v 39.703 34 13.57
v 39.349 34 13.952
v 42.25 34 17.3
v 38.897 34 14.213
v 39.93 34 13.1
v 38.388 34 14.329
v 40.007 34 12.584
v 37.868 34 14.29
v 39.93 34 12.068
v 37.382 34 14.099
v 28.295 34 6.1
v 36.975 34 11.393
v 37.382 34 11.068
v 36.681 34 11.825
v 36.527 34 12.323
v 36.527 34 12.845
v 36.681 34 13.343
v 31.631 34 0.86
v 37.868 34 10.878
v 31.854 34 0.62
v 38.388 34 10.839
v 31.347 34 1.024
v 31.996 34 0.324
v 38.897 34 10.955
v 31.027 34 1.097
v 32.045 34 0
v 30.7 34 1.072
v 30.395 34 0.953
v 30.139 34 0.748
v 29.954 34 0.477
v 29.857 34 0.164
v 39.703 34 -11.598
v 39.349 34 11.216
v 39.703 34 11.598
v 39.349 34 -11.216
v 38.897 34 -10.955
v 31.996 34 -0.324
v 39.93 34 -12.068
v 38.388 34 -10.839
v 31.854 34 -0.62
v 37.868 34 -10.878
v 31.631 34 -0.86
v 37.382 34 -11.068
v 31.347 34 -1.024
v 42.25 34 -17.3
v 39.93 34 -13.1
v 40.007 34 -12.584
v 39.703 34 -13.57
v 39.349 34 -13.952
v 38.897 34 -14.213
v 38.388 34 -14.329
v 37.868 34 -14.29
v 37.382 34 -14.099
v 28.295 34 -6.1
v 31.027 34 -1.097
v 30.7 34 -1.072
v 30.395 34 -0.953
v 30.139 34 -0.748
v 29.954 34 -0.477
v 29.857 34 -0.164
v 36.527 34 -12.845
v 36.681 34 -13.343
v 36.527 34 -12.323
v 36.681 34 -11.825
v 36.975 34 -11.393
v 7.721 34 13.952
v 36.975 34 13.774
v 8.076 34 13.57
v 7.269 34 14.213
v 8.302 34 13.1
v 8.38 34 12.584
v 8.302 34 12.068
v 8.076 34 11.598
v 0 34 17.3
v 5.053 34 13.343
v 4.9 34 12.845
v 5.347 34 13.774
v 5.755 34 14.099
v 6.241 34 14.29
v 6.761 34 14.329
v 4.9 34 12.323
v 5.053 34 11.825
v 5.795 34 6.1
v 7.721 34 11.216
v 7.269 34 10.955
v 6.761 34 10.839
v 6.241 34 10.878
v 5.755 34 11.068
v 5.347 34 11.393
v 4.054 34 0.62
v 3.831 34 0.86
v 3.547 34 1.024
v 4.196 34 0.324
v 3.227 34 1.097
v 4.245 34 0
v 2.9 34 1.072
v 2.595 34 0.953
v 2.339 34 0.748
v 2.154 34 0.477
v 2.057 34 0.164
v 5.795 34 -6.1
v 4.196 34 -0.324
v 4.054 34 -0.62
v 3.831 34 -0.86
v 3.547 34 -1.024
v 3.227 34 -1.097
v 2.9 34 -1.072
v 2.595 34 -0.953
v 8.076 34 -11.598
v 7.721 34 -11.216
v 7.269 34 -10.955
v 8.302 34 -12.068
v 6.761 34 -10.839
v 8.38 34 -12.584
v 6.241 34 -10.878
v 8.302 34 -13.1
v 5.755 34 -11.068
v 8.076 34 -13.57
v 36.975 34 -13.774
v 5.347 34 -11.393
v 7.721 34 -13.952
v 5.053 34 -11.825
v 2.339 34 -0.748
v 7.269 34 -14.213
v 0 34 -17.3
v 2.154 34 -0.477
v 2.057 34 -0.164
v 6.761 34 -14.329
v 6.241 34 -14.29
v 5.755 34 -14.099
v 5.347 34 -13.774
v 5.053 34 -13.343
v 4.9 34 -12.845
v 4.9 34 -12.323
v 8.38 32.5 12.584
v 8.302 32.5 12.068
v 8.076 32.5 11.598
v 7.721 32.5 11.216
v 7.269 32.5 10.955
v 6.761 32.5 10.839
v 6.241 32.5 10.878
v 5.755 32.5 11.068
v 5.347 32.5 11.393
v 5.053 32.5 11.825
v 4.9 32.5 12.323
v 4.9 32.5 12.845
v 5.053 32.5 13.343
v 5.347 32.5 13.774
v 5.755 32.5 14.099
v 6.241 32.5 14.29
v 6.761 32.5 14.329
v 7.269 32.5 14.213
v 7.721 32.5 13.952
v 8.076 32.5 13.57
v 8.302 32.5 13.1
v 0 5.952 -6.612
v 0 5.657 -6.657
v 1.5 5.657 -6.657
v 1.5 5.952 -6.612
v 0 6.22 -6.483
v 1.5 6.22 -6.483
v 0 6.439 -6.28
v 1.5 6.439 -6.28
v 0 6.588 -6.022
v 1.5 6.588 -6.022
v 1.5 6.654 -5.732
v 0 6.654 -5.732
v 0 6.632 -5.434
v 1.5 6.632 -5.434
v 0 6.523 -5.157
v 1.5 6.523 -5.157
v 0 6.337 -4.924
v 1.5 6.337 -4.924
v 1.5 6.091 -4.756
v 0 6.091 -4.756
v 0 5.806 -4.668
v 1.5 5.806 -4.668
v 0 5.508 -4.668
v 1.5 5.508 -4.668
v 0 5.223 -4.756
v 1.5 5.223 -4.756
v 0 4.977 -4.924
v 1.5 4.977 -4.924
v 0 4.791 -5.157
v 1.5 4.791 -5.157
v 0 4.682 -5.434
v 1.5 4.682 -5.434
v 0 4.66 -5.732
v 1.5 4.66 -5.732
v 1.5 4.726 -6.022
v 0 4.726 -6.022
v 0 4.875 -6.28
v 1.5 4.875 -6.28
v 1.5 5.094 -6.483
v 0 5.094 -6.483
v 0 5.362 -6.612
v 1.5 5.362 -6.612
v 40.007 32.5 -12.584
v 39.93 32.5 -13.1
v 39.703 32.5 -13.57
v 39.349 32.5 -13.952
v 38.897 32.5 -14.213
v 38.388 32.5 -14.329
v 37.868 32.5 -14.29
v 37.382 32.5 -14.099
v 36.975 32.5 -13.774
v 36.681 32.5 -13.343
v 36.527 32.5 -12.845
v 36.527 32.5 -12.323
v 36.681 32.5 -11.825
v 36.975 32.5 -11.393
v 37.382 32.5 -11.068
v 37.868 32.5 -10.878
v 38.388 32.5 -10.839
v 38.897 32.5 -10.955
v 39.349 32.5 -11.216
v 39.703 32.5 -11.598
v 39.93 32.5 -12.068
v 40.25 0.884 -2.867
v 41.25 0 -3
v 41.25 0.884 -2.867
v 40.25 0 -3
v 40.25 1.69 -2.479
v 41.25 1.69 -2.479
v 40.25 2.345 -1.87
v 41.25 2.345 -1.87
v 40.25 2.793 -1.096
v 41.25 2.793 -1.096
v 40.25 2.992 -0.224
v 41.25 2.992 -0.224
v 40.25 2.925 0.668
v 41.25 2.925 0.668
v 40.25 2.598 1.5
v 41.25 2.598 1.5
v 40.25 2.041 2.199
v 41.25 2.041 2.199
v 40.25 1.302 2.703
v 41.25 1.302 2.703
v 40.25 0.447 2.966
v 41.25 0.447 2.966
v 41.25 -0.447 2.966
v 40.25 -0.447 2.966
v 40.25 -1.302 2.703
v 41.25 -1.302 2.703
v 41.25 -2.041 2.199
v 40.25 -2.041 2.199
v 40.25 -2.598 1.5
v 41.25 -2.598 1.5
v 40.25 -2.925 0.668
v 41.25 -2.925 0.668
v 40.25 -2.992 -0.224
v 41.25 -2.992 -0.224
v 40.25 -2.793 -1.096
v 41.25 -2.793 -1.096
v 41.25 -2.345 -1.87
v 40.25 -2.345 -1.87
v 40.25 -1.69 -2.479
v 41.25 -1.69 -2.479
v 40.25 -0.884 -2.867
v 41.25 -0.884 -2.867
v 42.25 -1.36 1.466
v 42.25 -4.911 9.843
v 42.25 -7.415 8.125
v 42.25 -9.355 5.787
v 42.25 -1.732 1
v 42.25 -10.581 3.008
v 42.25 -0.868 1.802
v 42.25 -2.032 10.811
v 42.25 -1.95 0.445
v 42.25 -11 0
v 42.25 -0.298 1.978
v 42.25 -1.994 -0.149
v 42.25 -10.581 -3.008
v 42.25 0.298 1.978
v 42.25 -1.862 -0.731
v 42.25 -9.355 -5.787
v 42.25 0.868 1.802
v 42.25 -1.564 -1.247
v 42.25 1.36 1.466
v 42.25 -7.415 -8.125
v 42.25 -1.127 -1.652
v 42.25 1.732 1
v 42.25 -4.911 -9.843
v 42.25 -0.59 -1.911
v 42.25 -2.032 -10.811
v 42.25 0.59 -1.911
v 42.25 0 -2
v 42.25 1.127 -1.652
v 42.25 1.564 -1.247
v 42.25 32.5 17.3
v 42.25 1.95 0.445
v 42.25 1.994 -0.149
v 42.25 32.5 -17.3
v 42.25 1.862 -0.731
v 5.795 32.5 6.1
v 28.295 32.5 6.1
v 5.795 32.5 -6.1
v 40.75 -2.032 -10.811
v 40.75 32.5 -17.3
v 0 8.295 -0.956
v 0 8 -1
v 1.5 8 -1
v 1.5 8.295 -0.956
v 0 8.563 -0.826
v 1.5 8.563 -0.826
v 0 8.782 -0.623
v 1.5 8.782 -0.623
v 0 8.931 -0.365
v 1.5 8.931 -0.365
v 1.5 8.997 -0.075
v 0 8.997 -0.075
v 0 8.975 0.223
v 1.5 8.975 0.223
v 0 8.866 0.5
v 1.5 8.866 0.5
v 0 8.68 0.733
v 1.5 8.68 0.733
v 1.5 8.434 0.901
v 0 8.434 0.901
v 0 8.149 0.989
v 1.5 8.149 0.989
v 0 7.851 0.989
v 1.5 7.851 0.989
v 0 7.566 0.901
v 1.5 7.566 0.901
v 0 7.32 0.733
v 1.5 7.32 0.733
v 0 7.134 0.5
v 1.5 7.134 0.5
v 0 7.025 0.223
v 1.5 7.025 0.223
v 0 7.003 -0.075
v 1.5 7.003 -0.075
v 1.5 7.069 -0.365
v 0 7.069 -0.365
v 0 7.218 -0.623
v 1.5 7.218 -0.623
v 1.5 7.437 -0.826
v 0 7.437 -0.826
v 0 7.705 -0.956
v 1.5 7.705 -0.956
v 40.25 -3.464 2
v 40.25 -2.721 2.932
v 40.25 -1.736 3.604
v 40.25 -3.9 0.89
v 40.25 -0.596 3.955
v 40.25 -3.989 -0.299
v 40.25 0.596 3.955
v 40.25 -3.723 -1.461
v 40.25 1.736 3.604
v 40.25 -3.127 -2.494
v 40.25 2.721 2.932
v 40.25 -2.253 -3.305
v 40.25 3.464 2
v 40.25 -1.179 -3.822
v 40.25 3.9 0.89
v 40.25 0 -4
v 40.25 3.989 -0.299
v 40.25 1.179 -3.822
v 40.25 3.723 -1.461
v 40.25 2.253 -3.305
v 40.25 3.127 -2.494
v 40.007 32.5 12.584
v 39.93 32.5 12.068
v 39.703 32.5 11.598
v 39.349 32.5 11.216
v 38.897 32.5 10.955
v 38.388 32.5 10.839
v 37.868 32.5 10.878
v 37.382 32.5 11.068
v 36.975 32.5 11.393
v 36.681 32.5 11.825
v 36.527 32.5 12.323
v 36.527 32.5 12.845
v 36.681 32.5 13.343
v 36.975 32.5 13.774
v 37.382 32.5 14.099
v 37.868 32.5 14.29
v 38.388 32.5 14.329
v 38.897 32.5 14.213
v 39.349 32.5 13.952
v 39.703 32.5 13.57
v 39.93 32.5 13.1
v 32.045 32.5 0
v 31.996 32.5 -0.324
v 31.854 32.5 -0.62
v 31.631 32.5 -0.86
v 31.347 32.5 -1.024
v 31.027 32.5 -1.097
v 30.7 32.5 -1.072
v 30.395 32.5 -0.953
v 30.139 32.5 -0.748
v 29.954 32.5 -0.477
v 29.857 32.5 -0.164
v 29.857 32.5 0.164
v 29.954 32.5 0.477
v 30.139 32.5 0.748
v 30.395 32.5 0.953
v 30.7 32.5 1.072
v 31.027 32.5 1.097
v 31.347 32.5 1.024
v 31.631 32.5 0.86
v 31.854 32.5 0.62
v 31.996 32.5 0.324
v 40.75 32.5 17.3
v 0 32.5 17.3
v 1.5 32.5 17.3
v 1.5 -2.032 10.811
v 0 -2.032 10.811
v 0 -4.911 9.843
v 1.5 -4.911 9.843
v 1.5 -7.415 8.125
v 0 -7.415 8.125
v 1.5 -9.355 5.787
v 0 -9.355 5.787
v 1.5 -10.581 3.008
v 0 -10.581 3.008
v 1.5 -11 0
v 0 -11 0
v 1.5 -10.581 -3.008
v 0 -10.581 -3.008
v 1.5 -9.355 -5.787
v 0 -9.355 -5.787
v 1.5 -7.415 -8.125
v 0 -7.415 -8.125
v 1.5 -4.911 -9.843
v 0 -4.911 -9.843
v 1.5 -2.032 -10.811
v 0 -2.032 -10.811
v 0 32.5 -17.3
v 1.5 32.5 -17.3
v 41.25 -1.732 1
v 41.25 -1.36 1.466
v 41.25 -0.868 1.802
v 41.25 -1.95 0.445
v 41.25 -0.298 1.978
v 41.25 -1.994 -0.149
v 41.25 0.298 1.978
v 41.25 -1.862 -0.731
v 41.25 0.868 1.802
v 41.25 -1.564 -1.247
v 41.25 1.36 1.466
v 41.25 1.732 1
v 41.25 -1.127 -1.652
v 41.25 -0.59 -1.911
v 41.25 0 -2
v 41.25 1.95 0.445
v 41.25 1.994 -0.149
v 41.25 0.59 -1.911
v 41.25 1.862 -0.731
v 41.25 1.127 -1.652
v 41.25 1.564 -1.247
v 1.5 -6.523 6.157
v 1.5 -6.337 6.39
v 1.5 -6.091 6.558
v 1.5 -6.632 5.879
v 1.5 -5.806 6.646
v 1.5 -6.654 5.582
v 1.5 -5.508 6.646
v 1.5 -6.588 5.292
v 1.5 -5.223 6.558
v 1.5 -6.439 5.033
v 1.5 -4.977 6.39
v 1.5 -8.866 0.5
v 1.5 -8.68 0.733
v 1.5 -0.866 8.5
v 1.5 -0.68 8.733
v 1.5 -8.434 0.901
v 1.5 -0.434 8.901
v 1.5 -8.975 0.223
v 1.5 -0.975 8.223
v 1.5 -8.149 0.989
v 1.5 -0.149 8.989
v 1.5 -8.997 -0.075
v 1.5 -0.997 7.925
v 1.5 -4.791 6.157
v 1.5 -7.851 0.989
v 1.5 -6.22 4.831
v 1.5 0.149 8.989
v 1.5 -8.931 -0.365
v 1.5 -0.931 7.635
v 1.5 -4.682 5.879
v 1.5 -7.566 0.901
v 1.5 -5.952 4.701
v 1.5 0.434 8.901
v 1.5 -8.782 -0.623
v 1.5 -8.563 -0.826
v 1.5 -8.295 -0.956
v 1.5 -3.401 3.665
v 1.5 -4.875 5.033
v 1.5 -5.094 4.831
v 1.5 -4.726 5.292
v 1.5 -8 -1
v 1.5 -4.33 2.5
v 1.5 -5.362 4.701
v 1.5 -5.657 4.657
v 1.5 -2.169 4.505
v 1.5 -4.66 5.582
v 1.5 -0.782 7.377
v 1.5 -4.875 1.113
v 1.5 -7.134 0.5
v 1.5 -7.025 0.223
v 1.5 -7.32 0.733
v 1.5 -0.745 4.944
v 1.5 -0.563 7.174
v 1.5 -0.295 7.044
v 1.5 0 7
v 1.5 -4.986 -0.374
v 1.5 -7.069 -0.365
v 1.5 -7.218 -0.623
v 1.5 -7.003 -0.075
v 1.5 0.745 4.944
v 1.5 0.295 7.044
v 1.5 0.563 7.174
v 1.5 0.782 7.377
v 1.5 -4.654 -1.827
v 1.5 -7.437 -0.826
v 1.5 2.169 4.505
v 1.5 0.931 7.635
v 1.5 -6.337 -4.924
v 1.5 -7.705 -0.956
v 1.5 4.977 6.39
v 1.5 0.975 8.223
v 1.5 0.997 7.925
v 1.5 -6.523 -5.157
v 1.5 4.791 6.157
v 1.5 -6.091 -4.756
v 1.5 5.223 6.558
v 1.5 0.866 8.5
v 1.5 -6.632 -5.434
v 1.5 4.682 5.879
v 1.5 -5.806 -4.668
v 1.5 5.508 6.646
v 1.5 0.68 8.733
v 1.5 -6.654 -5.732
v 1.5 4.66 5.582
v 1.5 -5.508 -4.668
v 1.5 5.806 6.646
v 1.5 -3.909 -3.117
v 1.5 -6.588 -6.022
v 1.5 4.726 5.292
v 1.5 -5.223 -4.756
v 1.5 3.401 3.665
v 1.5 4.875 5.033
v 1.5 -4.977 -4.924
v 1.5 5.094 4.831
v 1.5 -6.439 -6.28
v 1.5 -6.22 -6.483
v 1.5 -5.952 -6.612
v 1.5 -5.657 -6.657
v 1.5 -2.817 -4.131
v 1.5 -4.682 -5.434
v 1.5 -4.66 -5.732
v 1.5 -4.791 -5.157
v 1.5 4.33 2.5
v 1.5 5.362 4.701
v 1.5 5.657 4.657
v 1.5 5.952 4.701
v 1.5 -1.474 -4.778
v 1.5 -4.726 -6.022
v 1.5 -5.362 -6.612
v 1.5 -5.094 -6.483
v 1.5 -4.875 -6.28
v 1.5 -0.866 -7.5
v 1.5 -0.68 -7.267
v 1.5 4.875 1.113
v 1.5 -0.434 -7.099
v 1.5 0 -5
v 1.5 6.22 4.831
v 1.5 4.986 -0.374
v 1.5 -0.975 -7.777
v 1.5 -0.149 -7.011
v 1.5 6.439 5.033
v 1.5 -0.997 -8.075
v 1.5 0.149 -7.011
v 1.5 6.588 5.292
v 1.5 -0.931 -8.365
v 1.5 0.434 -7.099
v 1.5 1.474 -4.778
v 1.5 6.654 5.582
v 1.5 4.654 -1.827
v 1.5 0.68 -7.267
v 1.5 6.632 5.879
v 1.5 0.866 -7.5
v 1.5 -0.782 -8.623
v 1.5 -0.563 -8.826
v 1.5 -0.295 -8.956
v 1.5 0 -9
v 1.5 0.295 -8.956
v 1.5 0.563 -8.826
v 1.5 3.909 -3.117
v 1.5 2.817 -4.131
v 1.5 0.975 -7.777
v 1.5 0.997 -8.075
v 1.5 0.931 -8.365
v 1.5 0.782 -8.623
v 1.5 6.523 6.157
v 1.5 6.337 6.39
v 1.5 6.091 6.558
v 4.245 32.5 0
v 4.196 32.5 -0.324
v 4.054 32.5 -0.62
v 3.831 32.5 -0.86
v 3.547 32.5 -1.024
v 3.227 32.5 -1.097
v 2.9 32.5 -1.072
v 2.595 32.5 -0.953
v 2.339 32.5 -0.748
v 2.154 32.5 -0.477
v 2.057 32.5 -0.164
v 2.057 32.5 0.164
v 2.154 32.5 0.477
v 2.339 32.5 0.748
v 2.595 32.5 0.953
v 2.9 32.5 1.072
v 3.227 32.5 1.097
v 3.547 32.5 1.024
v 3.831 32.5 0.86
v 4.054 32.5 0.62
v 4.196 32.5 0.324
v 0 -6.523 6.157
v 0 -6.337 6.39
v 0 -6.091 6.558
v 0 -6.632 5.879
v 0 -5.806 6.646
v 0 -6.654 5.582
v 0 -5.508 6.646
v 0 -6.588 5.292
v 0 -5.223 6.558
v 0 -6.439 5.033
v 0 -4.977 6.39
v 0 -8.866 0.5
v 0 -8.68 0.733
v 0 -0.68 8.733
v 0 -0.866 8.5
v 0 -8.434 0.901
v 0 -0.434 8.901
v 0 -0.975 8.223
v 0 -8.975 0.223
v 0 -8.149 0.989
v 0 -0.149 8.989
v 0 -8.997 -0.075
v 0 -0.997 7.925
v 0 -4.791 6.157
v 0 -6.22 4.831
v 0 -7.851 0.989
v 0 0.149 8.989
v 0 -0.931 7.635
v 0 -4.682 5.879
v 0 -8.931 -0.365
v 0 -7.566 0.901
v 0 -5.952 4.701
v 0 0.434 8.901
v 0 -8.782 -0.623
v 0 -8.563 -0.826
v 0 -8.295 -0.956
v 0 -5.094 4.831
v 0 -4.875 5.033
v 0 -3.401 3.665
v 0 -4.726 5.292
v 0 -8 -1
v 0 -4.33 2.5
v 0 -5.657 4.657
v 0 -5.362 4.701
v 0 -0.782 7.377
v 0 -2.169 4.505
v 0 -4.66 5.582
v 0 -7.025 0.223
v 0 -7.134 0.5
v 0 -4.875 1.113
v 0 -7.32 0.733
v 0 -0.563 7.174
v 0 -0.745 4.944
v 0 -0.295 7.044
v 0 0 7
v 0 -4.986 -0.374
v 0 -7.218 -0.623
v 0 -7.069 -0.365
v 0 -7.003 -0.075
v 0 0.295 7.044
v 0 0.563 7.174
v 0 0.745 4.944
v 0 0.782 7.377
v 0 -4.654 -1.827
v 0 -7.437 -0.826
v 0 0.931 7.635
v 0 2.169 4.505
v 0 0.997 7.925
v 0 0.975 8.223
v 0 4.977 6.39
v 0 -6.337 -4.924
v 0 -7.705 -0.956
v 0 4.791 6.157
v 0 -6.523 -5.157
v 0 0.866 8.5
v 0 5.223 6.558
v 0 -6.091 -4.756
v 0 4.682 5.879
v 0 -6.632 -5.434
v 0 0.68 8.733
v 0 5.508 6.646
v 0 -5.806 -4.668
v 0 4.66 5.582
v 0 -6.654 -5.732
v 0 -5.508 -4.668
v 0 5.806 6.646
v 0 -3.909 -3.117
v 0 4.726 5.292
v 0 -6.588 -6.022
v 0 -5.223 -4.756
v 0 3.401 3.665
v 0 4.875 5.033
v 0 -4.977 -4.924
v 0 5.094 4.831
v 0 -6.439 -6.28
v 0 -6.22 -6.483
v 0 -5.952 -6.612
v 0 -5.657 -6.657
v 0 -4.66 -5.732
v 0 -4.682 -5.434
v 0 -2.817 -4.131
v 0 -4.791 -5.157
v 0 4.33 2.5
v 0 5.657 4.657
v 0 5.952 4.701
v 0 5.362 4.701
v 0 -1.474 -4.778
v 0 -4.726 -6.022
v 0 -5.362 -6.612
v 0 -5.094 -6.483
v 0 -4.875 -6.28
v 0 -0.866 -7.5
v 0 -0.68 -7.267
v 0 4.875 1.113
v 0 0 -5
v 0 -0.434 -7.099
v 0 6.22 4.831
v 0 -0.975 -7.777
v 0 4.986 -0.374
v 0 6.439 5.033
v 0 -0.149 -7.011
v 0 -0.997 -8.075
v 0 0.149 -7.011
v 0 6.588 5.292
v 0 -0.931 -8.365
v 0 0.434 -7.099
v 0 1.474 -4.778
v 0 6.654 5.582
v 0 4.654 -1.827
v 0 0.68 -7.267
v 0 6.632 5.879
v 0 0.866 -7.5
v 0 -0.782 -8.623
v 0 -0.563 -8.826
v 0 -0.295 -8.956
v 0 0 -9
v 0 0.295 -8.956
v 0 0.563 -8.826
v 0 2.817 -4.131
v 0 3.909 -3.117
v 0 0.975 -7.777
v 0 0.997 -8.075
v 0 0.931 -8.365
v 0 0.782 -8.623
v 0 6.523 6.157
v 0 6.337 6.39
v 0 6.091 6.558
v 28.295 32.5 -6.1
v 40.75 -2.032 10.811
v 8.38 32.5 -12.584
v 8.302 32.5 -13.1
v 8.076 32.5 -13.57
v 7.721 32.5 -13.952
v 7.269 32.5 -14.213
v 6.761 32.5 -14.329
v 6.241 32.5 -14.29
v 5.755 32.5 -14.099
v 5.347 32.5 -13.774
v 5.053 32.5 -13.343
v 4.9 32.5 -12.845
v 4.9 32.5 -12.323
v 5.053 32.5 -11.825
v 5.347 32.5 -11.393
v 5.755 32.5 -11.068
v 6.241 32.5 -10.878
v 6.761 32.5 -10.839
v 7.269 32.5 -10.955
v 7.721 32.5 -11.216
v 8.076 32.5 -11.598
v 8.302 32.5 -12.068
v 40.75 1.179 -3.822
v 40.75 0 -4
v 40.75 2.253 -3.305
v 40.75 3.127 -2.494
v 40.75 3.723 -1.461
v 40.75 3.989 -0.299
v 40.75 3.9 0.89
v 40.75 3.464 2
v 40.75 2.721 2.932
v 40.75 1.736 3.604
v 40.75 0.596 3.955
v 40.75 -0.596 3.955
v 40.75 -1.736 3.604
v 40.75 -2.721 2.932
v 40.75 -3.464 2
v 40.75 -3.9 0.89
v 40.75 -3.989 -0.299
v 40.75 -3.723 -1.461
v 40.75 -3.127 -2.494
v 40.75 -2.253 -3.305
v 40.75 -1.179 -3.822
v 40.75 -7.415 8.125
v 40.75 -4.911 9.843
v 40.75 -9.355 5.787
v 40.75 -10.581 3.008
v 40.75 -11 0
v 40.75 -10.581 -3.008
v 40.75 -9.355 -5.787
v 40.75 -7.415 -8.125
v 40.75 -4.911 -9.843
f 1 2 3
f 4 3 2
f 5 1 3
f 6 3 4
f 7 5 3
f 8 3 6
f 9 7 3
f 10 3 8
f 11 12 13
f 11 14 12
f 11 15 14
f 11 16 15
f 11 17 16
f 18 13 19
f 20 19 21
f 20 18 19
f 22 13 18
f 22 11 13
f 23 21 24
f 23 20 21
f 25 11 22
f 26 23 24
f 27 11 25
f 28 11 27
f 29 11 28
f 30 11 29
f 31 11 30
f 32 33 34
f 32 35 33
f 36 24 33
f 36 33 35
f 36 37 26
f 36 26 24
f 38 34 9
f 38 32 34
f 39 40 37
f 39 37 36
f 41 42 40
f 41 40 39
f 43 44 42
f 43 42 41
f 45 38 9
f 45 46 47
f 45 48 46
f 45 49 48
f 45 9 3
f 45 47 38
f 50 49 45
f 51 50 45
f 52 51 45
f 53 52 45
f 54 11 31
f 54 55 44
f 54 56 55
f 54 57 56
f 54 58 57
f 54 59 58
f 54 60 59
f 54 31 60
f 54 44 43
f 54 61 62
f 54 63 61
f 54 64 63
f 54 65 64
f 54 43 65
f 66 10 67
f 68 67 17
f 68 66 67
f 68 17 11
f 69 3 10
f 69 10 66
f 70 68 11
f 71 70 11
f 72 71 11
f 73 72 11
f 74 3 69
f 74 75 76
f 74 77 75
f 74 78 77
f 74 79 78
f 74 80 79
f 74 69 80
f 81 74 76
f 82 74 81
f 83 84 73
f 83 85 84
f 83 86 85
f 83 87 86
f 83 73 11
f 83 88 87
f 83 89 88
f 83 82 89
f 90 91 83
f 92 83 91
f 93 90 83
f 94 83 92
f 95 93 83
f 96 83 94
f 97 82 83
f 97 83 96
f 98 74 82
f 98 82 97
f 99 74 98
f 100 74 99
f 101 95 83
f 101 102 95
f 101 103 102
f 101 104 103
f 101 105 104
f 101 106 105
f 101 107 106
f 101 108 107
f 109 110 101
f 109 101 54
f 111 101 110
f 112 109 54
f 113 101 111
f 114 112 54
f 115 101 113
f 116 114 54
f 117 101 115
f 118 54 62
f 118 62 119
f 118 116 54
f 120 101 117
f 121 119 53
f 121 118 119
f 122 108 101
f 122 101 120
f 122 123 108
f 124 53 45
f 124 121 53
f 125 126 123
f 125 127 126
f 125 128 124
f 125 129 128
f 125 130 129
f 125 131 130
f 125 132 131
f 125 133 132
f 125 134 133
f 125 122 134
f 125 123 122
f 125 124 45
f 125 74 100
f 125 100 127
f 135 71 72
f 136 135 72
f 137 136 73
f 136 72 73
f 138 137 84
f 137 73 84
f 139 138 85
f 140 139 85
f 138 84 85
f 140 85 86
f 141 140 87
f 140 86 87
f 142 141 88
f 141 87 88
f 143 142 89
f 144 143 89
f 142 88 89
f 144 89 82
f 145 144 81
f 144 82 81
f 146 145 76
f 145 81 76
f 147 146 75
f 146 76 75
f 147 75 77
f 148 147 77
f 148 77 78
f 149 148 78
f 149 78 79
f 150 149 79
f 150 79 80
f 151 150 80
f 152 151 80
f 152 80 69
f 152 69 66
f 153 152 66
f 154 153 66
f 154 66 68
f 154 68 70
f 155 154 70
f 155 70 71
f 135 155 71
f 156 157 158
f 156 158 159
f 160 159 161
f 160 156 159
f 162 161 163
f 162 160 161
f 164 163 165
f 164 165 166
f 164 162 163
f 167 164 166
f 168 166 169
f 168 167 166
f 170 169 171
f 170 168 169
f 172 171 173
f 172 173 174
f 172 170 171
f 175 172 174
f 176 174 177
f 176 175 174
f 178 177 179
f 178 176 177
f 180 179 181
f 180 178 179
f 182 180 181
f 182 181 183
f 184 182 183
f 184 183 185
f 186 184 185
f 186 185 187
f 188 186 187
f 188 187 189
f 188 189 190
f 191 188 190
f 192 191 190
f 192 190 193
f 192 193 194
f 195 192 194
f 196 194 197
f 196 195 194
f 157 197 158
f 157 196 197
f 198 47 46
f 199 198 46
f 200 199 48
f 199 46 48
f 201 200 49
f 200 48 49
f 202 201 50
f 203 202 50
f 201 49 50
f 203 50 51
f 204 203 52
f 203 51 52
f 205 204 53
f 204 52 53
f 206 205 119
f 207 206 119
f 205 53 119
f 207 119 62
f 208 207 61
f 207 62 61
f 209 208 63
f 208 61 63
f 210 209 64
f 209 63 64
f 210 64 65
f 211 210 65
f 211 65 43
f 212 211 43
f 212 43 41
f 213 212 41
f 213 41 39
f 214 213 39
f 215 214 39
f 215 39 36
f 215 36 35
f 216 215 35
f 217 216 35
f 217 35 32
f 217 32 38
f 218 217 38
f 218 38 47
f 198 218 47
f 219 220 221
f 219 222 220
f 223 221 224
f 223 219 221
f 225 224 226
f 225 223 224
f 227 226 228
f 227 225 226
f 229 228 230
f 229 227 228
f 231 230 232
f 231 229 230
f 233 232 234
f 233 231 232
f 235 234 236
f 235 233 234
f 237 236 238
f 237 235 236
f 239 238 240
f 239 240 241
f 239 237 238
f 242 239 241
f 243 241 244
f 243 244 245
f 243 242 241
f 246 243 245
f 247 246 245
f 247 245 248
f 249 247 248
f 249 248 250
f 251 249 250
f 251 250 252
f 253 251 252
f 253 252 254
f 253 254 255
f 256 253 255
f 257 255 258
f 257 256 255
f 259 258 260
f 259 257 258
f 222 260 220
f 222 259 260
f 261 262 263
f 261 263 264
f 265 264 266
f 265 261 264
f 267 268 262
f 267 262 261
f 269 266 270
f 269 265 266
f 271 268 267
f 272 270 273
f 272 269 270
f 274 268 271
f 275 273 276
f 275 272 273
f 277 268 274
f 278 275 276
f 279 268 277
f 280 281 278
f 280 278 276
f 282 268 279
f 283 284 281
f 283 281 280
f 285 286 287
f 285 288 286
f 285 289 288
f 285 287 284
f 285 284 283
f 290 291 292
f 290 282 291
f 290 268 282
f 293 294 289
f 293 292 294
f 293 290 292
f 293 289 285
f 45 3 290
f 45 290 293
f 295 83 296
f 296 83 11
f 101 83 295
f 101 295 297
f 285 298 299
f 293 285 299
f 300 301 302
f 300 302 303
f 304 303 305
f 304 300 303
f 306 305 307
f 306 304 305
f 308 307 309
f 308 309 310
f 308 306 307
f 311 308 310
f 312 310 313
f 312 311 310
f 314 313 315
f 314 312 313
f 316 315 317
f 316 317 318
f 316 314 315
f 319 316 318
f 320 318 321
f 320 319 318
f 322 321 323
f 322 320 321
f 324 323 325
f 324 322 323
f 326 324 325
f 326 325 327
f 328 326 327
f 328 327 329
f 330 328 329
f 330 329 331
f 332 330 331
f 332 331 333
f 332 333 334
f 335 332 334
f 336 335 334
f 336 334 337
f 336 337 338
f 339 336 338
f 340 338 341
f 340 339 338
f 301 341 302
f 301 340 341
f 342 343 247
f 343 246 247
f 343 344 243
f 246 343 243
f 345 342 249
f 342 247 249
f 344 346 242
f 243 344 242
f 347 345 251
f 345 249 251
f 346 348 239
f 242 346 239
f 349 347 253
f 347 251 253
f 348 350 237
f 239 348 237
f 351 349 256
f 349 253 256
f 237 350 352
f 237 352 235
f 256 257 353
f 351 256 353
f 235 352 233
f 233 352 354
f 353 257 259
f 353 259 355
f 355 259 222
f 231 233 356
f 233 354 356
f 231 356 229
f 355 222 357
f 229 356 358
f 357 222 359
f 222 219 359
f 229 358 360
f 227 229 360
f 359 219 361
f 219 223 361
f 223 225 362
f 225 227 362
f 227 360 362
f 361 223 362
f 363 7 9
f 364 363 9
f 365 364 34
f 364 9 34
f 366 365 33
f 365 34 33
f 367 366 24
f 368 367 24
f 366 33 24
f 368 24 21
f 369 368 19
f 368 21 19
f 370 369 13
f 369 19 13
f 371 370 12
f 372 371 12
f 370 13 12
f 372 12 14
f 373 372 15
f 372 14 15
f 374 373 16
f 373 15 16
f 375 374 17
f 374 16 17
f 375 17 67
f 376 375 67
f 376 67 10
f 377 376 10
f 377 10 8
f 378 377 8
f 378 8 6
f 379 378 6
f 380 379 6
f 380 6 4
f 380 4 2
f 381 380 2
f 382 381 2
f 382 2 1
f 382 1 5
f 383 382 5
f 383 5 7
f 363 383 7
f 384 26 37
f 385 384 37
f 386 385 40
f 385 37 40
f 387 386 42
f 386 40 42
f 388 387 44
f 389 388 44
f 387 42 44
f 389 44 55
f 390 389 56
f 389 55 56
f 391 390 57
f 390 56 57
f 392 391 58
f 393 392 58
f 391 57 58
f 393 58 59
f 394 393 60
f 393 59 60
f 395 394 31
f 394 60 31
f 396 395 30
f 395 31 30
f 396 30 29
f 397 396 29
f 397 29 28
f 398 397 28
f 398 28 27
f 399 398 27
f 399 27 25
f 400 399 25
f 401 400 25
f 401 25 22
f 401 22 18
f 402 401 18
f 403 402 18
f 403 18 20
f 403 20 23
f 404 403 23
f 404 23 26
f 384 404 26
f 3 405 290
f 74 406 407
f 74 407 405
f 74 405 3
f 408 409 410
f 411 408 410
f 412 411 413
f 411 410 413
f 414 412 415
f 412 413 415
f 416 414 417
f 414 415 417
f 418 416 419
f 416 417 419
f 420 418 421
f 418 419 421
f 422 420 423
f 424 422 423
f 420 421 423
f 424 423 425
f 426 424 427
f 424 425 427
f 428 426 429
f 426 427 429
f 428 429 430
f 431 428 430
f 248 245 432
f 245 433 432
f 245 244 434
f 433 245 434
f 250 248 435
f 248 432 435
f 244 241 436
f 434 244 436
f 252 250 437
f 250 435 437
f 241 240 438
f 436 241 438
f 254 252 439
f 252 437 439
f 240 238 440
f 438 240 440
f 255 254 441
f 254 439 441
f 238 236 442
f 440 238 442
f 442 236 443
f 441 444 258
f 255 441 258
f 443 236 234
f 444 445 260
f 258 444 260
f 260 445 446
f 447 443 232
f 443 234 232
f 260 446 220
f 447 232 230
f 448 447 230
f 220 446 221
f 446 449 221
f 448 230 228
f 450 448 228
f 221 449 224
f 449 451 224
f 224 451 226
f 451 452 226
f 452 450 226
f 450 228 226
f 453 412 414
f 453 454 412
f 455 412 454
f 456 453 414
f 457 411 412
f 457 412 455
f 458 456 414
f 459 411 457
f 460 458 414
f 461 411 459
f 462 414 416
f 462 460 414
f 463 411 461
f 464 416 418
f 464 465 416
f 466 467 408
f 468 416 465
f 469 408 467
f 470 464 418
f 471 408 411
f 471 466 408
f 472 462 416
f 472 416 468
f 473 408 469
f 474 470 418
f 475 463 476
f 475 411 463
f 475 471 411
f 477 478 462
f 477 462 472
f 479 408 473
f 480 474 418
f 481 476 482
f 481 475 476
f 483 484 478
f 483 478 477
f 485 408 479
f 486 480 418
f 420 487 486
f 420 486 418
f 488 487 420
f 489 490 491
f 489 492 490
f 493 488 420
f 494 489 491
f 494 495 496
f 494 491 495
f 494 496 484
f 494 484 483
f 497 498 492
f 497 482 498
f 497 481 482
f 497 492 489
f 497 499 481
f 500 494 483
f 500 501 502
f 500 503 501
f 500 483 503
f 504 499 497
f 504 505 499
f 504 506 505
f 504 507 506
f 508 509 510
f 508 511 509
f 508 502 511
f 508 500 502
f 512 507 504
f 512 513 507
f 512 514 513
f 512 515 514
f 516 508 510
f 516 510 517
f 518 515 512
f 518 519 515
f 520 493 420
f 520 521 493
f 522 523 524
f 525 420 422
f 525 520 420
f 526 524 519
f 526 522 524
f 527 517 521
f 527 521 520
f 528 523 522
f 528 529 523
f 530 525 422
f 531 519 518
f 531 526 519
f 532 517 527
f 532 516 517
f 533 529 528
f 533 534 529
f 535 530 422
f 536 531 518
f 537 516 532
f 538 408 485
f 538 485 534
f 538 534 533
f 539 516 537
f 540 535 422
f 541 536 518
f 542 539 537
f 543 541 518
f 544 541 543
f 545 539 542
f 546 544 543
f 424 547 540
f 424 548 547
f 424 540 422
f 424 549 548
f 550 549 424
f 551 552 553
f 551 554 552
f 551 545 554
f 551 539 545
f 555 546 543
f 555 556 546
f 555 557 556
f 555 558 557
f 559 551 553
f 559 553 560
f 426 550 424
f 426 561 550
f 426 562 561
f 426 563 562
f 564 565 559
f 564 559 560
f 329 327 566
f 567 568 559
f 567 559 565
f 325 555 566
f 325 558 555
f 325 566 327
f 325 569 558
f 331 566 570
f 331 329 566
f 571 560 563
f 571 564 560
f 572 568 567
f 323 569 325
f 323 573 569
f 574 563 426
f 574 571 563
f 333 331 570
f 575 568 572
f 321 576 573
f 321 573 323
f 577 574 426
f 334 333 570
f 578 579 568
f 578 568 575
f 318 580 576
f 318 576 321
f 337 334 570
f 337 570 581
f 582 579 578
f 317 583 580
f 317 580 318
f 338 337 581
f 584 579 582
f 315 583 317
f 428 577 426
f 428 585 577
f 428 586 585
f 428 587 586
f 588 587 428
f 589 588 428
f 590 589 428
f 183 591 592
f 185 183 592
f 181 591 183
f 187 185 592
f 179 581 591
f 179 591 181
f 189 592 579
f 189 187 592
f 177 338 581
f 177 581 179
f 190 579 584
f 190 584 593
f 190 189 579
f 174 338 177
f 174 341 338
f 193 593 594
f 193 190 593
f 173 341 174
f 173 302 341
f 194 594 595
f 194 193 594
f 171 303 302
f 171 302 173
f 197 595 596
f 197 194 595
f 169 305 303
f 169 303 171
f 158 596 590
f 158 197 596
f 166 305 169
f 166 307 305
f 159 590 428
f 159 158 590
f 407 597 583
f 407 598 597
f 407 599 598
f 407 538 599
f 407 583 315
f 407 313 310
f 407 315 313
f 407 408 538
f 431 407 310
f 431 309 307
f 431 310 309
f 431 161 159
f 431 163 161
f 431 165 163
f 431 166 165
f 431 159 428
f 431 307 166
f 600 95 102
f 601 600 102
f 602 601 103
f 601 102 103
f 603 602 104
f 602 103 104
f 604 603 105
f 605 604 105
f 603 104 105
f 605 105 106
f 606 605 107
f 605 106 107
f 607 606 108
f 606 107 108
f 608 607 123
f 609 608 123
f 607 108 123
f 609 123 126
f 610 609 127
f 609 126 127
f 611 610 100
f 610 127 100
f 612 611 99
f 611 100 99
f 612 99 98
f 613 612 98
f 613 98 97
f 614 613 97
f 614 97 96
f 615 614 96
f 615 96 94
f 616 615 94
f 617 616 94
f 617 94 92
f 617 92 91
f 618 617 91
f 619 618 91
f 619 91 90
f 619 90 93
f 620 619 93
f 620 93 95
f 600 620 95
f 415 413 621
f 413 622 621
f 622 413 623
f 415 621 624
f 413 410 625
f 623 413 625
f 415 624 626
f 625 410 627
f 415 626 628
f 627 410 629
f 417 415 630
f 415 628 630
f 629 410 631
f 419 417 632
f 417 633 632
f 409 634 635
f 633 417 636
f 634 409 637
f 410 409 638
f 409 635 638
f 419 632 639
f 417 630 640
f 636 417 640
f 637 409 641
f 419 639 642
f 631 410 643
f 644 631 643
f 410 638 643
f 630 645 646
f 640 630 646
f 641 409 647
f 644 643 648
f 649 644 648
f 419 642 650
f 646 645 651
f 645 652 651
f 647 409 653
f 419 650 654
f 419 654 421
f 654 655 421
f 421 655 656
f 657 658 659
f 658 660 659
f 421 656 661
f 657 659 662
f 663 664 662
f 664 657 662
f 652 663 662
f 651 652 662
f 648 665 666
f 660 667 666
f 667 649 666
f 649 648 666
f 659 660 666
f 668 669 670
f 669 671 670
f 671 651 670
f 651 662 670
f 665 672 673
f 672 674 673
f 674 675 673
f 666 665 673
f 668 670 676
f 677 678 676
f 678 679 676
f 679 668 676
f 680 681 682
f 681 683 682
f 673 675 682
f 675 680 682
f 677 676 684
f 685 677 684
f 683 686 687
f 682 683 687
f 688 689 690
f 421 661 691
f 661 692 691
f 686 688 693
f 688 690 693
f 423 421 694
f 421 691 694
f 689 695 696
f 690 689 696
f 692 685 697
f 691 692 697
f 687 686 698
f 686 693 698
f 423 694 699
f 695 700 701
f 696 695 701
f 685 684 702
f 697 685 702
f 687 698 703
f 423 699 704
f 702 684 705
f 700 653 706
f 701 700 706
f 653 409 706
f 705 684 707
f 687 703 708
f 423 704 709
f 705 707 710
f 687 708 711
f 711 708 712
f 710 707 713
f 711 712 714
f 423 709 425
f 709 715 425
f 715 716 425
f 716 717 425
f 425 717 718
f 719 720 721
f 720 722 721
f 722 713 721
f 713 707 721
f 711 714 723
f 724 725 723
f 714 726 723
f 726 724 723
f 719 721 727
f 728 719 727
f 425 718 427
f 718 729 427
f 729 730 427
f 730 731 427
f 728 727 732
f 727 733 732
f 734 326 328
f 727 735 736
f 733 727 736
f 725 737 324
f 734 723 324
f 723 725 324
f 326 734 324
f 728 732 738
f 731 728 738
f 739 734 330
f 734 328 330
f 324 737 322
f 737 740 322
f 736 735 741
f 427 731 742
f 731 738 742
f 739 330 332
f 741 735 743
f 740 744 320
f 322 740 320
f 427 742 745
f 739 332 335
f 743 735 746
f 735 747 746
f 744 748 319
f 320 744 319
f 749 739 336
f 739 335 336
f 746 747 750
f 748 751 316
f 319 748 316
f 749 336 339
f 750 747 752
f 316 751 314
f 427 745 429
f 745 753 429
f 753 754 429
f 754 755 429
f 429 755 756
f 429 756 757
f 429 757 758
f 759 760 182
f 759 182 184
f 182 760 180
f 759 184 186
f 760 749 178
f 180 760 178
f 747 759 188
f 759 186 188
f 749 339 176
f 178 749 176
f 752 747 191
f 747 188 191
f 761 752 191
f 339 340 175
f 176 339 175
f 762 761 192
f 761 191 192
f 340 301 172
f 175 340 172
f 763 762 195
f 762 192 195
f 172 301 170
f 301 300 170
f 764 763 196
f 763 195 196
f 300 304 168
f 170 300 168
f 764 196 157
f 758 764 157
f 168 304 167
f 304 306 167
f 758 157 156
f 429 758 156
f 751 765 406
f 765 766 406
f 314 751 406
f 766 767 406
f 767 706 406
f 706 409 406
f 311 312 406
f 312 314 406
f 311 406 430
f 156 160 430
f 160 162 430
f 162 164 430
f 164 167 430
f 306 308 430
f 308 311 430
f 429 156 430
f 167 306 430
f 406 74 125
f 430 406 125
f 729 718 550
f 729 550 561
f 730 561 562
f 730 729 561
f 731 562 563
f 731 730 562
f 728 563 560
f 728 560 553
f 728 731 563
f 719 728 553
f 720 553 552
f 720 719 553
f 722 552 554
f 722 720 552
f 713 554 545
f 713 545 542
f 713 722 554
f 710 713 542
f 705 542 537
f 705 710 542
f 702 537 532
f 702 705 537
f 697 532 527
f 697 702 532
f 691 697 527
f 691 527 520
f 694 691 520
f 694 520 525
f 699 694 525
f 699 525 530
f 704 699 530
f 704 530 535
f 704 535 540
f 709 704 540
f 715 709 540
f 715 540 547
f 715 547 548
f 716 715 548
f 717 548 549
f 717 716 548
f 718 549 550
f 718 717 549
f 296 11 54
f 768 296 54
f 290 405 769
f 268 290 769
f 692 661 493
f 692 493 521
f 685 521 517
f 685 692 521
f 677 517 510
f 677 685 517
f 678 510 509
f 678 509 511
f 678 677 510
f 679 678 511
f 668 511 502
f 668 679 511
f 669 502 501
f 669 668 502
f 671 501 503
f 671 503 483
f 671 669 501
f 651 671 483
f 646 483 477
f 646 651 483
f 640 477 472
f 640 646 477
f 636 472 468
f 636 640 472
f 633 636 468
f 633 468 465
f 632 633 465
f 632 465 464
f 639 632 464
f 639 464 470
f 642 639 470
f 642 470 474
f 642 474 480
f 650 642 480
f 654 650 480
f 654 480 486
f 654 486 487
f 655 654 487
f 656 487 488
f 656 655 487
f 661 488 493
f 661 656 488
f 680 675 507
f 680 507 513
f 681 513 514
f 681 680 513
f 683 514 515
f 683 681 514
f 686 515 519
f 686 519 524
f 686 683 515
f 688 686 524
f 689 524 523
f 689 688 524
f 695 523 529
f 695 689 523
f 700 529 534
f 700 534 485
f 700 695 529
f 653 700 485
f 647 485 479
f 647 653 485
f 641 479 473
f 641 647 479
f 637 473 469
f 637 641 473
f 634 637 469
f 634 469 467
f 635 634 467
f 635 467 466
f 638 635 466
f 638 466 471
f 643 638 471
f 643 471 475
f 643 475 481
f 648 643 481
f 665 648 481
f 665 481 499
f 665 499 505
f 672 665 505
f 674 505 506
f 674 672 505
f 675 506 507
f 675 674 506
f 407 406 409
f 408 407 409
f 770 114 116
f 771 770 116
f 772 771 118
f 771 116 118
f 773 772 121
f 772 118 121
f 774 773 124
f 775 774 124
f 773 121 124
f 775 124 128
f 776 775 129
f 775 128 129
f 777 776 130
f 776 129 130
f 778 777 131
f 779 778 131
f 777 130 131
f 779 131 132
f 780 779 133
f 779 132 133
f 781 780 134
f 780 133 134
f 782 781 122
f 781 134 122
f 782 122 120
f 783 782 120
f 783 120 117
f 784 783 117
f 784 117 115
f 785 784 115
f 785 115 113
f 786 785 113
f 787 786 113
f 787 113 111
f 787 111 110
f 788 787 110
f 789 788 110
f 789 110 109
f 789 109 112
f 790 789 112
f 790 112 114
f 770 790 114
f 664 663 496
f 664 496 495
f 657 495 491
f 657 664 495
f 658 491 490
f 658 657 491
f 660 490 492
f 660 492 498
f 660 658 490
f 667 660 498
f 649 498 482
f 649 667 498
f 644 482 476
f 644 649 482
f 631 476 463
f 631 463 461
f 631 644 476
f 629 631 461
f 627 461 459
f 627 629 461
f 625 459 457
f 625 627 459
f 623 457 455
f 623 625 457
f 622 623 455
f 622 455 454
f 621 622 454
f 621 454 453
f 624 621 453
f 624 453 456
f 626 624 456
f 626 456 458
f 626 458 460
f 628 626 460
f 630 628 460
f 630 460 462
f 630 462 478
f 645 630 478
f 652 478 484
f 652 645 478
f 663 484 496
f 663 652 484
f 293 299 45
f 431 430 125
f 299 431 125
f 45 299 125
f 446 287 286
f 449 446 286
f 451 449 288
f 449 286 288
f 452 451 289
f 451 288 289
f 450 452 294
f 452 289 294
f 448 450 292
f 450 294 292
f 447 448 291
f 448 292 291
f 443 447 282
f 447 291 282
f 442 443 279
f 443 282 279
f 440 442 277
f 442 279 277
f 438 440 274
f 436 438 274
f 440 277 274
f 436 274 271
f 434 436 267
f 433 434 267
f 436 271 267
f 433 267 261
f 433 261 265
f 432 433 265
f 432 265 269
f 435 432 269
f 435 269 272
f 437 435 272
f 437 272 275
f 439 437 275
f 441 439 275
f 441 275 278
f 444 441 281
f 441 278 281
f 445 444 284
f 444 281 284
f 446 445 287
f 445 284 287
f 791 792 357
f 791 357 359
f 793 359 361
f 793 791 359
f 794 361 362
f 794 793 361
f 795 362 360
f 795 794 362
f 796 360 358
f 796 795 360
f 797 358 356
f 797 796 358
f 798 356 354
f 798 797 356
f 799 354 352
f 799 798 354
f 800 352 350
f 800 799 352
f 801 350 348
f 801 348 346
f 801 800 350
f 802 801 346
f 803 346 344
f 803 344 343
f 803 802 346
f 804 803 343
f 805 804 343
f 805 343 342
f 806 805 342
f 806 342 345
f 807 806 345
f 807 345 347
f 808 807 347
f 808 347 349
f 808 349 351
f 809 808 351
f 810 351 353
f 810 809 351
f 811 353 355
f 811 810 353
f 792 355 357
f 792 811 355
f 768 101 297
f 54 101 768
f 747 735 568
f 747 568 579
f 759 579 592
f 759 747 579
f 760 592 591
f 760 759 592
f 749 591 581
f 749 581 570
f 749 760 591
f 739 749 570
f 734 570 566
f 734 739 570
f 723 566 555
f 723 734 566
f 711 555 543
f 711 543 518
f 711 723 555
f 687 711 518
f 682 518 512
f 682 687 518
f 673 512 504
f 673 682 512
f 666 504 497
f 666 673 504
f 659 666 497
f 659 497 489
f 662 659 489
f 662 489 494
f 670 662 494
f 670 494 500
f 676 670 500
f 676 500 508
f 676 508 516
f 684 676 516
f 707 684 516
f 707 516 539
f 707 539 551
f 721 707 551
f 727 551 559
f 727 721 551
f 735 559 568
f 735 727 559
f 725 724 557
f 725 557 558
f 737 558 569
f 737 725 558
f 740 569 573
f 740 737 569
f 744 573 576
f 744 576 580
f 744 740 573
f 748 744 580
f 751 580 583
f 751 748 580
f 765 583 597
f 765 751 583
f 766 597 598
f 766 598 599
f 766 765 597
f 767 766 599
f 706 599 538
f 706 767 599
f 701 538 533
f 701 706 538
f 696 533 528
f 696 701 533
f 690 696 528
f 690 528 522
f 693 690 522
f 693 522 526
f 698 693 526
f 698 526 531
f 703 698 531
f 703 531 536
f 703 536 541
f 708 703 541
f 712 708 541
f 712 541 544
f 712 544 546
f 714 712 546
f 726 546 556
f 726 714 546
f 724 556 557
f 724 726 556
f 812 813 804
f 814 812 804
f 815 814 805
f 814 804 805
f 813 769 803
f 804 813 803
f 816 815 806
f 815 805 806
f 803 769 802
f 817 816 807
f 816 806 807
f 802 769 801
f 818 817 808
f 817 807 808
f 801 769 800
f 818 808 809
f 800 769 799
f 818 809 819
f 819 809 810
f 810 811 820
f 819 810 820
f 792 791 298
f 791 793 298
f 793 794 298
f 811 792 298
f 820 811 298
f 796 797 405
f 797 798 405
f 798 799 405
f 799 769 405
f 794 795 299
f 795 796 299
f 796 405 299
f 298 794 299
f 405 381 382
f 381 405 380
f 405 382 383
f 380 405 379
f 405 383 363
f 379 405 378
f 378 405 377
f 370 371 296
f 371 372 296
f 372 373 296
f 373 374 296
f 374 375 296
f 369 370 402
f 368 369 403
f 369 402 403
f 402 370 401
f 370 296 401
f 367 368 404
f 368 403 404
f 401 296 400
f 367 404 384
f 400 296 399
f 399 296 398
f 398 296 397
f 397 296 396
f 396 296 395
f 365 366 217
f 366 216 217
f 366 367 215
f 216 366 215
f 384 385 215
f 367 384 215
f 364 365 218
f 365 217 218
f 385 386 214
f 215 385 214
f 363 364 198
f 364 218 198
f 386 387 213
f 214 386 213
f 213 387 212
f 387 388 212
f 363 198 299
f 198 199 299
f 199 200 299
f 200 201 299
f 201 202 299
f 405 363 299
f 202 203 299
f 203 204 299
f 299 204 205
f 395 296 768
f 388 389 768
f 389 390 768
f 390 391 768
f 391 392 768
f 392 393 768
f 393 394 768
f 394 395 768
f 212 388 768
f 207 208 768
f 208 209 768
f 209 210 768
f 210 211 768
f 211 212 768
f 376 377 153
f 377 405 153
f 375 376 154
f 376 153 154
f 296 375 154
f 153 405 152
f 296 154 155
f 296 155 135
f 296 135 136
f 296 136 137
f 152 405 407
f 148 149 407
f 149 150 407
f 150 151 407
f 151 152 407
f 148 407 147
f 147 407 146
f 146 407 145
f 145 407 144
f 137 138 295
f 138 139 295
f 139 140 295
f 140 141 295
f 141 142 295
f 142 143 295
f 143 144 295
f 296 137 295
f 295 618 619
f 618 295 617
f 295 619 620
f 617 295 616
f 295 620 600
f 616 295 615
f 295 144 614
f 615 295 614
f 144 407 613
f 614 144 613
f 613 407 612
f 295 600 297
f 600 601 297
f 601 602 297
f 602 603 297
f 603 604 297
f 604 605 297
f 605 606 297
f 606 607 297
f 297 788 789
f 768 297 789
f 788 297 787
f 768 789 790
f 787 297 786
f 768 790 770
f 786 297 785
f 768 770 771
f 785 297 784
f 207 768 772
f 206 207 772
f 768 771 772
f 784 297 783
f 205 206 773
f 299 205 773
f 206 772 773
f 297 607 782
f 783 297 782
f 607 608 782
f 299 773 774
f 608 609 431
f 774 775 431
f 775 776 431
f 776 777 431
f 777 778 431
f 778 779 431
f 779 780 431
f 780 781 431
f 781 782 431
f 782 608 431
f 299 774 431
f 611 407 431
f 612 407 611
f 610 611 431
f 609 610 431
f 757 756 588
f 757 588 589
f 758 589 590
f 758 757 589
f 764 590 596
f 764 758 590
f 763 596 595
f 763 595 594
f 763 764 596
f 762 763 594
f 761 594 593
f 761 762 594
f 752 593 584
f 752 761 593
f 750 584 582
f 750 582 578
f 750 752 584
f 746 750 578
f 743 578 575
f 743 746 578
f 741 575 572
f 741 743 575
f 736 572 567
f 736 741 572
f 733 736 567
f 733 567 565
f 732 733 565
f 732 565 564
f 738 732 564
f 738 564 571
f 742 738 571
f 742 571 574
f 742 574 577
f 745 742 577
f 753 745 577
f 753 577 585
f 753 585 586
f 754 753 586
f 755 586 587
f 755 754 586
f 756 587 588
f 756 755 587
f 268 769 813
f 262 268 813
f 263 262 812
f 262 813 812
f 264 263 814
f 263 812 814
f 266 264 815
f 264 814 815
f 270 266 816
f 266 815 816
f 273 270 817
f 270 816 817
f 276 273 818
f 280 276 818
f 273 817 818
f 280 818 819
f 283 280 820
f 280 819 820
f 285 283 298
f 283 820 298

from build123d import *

# Parameters (mm, degrees)
SKETCH2_W           = 34.6
SKETCH2_H           = 1.5
SKETCH2_R           = 11
SKETCH2_R_2         = 1
SKETCH2_R_3         = 5
BOSS_EXTRUDE1_DEPTH = 1.5
SKETCH2_3_W         = 34.6
SKETCH2_3_H         = 1.5
BOSS_EXTRUDE2_DEPTH = 40.75
BOSS_EXTRUDE3_START = 40.75
SKETCH2_6_W         = 34.6
SKETCH2_6_H         = 1.5
SKETCH2_6_R         = 11
SKETCH2_6_R_2       = 1
SKETCH2_6_R_3       = 5
SKETCH2_6_R_4       = 4
SKETCH2_6_R_5       = 3
BOSS_EXTRUDE3_DEPTH = 1.5
SKETCH3_R           = 1.1
SKETCH3_R_2         = 1.75
SKETCH3_W           = 22.5
SKETCH3_H           = 12.2
CUT_EXTRUDE1_DEPTH  = 46
BOSS_EXTRUDE4_START = 40.75
SKETCH2_7_R         = 4
SKETCH2_7_R_2       = 3
BOSS_EXTRUDE4_DEPTH = 0.5
SKETCH4_R           = 3
SKETCH4_R_2         = 2
BOSS_EXTRUDE5_DEPTH = 1


with BuildPart() as part:
    # Sketch2 → Boss-Extrude1 (new body)
    with BuildSketch(Plane(origin=(0, 0, 0), x_dir=(0, 0, -1), z_dir=(1, 0, 0))):
        with BuildLine():
            Line((17.3, 32.5), (-17.3, 32.5))
            Line((-17.3, 32.5), (-10.810767407, -2.031577728))
            ThreePointArc((-10.810767407, -2.031577728), (-1.020185895, 10.952589682), (11, 0))
            ThreePointArc((11, 0), (10.952589682, -1.020185895), (10.810767407, -2.031577728))
            Line((10.810767407, -2.031577728), (17.3, 32.5))
        make_face()
        with Locations((0, 33.25)):
            Rectangle(SKETCH2_W, SKETCH2_H)
        Circle(SKETCH2_R)
        with Locations((-5.656854249, 5.656854249)):
            Circle(SKETCH2_R_2, mode=Mode.SUBTRACT)
        with Locations((-8, 0)):
            Circle(SKETCH2_R_2, mode=Mode.SUBTRACT)
        with Locations((-5.656854249, -5.656854249)):
            Circle(SKETCH2_R_2, mode=Mode.SUBTRACT)
        with Locations((0, -8)):
            Circle(SKETCH2_R_2, mode=Mode.SUBTRACT)
        with Locations((5.656854249, -5.656854249)):
            Circle(SKETCH2_R_2, mode=Mode.SUBTRACT)
        with Locations((8, 0)):
            Circle(SKETCH2_R_2, mode=Mode.SUBTRACT)
        with Locations((5.656854249, 5.656854249)):
            Circle(SKETCH2_R_2, mode=Mode.SUBTRACT)
        with Locations((0, 8)):
            Circle(SKETCH2_R_2, mode=Mode.SUBTRACT)
        Circle(SKETCH2_R_3, mode=Mode.SUBTRACT)
    extrude(amount=BOSS_EXTRUDE1_DEPTH)

    # Sketch2<3> → Boss-Extrude2 (add)
    with BuildSketch(Plane(origin=(0, 0, 0), x_dir=(0, 0, -1), z_dir=(1, 0, 0))):
        with Locations((0, 33.25)):
            Rectangle(SKETCH2_3_W, SKETCH2_3_H)
    extrude(amount=BOSS_EXTRUDE2_DEPTH)

    # Sketch2<6> → Boss-Extrude3 (add)
    with BuildSketch(Plane(origin=(0, 0, 0), x_dir=(0, 0, -1), z_dir=(1, 0, 0)).offset(BOSS_EXTRUDE3_START)):
        with Locations((0, 33.25)):
            Rectangle(SKETCH2_6_W, SKETCH2_6_H)
        with BuildLine():
            Line((17.3, 32.5), (-17.3, 32.5))
            Line((-17.3, 32.5), (-10.810767407, -2.031577728))
            ThreePointArc((-10.810767407, -2.031577728), (-1.020185895, 10.952589682), (11, 0))
            ThreePointArc((11, 0), (10.952589682, -1.020185895), (10.810767407, -2.031577728))
            Line((10.810767407, -2.031577728), (17.3, 32.5))
        make_face()
        Circle(SKETCH2_6_R)
        with Locations((-5.656854249, 5.656854249)):
            Circle(SKETCH2_6_R_2, mode=Mode.SUBTRACT)
        with Locations((-8, 0)):
            Circle(SKETCH2_6_R_2, mode=Mode.SUBTRACT)
        with Locations((-5.656854249, -5.656854249)):
            Circle(SKETCH2_6_R_2, mode=Mode.SUBTRACT)
        with Locations((0, -8)):
            Circle(SKETCH2_6_R_2, mode=Mode.SUBTRACT)
        with Locations((5.656854249, -5.656854249)):
            Circle(SKETCH2_6_R_2, mode=Mode.SUBTRACT)
        with Locations((8, 0)):
            Circle(SKETCH2_6_R_2, mode=Mode.SUBTRACT)
        with Locations((5.656854249, 5.656854249)):
            Circle(SKETCH2_6_R_2, mode=Mode.SUBTRACT)
        with Locations((0, 8)):
            Circle(SKETCH2_6_R_2, mode=Mode.SUBTRACT)
        Circle(SKETCH2_6_R_3, mode=Mode.SUBTRACT)
        with Locations((0, 8)):
            Circle(SKETCH2_6_R_2)
        with Locations((-5.656854249, 5.656854249)):
            Circle(SKETCH2_6_R_2)
        with Locations((-8, 0)):
            Circle(SKETCH2_6_R_2)
        with Locations((-5.656854249, -5.656854249)):
            Circle(SKETCH2_6_R_2)
        with Locations((0, -8)):
            Circle(SKETCH2_6_R_2)
        with Locations((5.656854249, -5.656854249)):
            Circle(SKETCH2_6_R_2)
        with Locations((8, 0)):
            Circle(SKETCH2_6_R_2)
        with Locations((5.656854249, 5.656854249)):
            Circle(SKETCH2_6_R_2)
        Circle(SKETCH2_6_R_3)
        Circle(SKETCH2_6_R_4, mode=Mode.SUBTRACT)
        Circle(SKETCH2_6_R_4)
        Circle(SKETCH2_6_R_5, mode=Mode.SUBTRACT)
    extrude(amount=BOSS_EXTRUDE3_DEPTH)

    # Sketch3 → Cut-Extrude1 (cut, through all)
    with BuildSketch(Plane(origin=(0, 34, 0), x_dir=(1, 0, 0), z_dir=(0, 1, 0))):
        with Locations((30.945, 0)):
            Circle(SKETCH3_R)
        with Locations((3.145, 0)):
            Circle(SKETCH3_R)
        with Locations((6.63, 12.583801515)):
            Circle(SKETCH3_R_2)
        with Locations((38.257478, 12.583801515)):
            Circle(SKETCH3_R_2)
        with Locations((38.257478, -12.583801515)):
            Circle(SKETCH3_R_2)
        with Locations((6.63, -12.583801515)):
            Circle(SKETCH3_R_2)
        with Locations((17.045, 0)):
            Rectangle(SKETCH3_W, SKETCH3_H)
    extrude(amount=-CUT_EXTRUDE1_DEPTH, mode=Mode.SUBTRACT)

    # Sketch2<7> → Boss-Extrude4 (add)
    with BuildSketch(Plane(origin=(0, 0, 0), x_dir=(0, 0, -1), z_dir=(1, 0, 0)).offset(BOSS_EXTRUDE4_START)):
        Circle(SKETCH2_7_R)
        Circle(SKETCH2_7_R_2, mode=Mode.SUBTRACT)
    extrude(amount=-BOSS_EXTRUDE4_DEPTH)

    # Sketch4 → Boss-Extrude5 (add)
    with BuildSketch(Plane(origin=(42.25, 0, 0), x_dir=(0, 0, -1), z_dir=(1, 0, 0))):
        Circle(SKETCH4_R)
        Circle(SKETCH4_R_2, mode=Mode.SUBTRACT)
    extrude(amount=-BOSS_EXTRUDE5_DEPTH)


solid = part.part
